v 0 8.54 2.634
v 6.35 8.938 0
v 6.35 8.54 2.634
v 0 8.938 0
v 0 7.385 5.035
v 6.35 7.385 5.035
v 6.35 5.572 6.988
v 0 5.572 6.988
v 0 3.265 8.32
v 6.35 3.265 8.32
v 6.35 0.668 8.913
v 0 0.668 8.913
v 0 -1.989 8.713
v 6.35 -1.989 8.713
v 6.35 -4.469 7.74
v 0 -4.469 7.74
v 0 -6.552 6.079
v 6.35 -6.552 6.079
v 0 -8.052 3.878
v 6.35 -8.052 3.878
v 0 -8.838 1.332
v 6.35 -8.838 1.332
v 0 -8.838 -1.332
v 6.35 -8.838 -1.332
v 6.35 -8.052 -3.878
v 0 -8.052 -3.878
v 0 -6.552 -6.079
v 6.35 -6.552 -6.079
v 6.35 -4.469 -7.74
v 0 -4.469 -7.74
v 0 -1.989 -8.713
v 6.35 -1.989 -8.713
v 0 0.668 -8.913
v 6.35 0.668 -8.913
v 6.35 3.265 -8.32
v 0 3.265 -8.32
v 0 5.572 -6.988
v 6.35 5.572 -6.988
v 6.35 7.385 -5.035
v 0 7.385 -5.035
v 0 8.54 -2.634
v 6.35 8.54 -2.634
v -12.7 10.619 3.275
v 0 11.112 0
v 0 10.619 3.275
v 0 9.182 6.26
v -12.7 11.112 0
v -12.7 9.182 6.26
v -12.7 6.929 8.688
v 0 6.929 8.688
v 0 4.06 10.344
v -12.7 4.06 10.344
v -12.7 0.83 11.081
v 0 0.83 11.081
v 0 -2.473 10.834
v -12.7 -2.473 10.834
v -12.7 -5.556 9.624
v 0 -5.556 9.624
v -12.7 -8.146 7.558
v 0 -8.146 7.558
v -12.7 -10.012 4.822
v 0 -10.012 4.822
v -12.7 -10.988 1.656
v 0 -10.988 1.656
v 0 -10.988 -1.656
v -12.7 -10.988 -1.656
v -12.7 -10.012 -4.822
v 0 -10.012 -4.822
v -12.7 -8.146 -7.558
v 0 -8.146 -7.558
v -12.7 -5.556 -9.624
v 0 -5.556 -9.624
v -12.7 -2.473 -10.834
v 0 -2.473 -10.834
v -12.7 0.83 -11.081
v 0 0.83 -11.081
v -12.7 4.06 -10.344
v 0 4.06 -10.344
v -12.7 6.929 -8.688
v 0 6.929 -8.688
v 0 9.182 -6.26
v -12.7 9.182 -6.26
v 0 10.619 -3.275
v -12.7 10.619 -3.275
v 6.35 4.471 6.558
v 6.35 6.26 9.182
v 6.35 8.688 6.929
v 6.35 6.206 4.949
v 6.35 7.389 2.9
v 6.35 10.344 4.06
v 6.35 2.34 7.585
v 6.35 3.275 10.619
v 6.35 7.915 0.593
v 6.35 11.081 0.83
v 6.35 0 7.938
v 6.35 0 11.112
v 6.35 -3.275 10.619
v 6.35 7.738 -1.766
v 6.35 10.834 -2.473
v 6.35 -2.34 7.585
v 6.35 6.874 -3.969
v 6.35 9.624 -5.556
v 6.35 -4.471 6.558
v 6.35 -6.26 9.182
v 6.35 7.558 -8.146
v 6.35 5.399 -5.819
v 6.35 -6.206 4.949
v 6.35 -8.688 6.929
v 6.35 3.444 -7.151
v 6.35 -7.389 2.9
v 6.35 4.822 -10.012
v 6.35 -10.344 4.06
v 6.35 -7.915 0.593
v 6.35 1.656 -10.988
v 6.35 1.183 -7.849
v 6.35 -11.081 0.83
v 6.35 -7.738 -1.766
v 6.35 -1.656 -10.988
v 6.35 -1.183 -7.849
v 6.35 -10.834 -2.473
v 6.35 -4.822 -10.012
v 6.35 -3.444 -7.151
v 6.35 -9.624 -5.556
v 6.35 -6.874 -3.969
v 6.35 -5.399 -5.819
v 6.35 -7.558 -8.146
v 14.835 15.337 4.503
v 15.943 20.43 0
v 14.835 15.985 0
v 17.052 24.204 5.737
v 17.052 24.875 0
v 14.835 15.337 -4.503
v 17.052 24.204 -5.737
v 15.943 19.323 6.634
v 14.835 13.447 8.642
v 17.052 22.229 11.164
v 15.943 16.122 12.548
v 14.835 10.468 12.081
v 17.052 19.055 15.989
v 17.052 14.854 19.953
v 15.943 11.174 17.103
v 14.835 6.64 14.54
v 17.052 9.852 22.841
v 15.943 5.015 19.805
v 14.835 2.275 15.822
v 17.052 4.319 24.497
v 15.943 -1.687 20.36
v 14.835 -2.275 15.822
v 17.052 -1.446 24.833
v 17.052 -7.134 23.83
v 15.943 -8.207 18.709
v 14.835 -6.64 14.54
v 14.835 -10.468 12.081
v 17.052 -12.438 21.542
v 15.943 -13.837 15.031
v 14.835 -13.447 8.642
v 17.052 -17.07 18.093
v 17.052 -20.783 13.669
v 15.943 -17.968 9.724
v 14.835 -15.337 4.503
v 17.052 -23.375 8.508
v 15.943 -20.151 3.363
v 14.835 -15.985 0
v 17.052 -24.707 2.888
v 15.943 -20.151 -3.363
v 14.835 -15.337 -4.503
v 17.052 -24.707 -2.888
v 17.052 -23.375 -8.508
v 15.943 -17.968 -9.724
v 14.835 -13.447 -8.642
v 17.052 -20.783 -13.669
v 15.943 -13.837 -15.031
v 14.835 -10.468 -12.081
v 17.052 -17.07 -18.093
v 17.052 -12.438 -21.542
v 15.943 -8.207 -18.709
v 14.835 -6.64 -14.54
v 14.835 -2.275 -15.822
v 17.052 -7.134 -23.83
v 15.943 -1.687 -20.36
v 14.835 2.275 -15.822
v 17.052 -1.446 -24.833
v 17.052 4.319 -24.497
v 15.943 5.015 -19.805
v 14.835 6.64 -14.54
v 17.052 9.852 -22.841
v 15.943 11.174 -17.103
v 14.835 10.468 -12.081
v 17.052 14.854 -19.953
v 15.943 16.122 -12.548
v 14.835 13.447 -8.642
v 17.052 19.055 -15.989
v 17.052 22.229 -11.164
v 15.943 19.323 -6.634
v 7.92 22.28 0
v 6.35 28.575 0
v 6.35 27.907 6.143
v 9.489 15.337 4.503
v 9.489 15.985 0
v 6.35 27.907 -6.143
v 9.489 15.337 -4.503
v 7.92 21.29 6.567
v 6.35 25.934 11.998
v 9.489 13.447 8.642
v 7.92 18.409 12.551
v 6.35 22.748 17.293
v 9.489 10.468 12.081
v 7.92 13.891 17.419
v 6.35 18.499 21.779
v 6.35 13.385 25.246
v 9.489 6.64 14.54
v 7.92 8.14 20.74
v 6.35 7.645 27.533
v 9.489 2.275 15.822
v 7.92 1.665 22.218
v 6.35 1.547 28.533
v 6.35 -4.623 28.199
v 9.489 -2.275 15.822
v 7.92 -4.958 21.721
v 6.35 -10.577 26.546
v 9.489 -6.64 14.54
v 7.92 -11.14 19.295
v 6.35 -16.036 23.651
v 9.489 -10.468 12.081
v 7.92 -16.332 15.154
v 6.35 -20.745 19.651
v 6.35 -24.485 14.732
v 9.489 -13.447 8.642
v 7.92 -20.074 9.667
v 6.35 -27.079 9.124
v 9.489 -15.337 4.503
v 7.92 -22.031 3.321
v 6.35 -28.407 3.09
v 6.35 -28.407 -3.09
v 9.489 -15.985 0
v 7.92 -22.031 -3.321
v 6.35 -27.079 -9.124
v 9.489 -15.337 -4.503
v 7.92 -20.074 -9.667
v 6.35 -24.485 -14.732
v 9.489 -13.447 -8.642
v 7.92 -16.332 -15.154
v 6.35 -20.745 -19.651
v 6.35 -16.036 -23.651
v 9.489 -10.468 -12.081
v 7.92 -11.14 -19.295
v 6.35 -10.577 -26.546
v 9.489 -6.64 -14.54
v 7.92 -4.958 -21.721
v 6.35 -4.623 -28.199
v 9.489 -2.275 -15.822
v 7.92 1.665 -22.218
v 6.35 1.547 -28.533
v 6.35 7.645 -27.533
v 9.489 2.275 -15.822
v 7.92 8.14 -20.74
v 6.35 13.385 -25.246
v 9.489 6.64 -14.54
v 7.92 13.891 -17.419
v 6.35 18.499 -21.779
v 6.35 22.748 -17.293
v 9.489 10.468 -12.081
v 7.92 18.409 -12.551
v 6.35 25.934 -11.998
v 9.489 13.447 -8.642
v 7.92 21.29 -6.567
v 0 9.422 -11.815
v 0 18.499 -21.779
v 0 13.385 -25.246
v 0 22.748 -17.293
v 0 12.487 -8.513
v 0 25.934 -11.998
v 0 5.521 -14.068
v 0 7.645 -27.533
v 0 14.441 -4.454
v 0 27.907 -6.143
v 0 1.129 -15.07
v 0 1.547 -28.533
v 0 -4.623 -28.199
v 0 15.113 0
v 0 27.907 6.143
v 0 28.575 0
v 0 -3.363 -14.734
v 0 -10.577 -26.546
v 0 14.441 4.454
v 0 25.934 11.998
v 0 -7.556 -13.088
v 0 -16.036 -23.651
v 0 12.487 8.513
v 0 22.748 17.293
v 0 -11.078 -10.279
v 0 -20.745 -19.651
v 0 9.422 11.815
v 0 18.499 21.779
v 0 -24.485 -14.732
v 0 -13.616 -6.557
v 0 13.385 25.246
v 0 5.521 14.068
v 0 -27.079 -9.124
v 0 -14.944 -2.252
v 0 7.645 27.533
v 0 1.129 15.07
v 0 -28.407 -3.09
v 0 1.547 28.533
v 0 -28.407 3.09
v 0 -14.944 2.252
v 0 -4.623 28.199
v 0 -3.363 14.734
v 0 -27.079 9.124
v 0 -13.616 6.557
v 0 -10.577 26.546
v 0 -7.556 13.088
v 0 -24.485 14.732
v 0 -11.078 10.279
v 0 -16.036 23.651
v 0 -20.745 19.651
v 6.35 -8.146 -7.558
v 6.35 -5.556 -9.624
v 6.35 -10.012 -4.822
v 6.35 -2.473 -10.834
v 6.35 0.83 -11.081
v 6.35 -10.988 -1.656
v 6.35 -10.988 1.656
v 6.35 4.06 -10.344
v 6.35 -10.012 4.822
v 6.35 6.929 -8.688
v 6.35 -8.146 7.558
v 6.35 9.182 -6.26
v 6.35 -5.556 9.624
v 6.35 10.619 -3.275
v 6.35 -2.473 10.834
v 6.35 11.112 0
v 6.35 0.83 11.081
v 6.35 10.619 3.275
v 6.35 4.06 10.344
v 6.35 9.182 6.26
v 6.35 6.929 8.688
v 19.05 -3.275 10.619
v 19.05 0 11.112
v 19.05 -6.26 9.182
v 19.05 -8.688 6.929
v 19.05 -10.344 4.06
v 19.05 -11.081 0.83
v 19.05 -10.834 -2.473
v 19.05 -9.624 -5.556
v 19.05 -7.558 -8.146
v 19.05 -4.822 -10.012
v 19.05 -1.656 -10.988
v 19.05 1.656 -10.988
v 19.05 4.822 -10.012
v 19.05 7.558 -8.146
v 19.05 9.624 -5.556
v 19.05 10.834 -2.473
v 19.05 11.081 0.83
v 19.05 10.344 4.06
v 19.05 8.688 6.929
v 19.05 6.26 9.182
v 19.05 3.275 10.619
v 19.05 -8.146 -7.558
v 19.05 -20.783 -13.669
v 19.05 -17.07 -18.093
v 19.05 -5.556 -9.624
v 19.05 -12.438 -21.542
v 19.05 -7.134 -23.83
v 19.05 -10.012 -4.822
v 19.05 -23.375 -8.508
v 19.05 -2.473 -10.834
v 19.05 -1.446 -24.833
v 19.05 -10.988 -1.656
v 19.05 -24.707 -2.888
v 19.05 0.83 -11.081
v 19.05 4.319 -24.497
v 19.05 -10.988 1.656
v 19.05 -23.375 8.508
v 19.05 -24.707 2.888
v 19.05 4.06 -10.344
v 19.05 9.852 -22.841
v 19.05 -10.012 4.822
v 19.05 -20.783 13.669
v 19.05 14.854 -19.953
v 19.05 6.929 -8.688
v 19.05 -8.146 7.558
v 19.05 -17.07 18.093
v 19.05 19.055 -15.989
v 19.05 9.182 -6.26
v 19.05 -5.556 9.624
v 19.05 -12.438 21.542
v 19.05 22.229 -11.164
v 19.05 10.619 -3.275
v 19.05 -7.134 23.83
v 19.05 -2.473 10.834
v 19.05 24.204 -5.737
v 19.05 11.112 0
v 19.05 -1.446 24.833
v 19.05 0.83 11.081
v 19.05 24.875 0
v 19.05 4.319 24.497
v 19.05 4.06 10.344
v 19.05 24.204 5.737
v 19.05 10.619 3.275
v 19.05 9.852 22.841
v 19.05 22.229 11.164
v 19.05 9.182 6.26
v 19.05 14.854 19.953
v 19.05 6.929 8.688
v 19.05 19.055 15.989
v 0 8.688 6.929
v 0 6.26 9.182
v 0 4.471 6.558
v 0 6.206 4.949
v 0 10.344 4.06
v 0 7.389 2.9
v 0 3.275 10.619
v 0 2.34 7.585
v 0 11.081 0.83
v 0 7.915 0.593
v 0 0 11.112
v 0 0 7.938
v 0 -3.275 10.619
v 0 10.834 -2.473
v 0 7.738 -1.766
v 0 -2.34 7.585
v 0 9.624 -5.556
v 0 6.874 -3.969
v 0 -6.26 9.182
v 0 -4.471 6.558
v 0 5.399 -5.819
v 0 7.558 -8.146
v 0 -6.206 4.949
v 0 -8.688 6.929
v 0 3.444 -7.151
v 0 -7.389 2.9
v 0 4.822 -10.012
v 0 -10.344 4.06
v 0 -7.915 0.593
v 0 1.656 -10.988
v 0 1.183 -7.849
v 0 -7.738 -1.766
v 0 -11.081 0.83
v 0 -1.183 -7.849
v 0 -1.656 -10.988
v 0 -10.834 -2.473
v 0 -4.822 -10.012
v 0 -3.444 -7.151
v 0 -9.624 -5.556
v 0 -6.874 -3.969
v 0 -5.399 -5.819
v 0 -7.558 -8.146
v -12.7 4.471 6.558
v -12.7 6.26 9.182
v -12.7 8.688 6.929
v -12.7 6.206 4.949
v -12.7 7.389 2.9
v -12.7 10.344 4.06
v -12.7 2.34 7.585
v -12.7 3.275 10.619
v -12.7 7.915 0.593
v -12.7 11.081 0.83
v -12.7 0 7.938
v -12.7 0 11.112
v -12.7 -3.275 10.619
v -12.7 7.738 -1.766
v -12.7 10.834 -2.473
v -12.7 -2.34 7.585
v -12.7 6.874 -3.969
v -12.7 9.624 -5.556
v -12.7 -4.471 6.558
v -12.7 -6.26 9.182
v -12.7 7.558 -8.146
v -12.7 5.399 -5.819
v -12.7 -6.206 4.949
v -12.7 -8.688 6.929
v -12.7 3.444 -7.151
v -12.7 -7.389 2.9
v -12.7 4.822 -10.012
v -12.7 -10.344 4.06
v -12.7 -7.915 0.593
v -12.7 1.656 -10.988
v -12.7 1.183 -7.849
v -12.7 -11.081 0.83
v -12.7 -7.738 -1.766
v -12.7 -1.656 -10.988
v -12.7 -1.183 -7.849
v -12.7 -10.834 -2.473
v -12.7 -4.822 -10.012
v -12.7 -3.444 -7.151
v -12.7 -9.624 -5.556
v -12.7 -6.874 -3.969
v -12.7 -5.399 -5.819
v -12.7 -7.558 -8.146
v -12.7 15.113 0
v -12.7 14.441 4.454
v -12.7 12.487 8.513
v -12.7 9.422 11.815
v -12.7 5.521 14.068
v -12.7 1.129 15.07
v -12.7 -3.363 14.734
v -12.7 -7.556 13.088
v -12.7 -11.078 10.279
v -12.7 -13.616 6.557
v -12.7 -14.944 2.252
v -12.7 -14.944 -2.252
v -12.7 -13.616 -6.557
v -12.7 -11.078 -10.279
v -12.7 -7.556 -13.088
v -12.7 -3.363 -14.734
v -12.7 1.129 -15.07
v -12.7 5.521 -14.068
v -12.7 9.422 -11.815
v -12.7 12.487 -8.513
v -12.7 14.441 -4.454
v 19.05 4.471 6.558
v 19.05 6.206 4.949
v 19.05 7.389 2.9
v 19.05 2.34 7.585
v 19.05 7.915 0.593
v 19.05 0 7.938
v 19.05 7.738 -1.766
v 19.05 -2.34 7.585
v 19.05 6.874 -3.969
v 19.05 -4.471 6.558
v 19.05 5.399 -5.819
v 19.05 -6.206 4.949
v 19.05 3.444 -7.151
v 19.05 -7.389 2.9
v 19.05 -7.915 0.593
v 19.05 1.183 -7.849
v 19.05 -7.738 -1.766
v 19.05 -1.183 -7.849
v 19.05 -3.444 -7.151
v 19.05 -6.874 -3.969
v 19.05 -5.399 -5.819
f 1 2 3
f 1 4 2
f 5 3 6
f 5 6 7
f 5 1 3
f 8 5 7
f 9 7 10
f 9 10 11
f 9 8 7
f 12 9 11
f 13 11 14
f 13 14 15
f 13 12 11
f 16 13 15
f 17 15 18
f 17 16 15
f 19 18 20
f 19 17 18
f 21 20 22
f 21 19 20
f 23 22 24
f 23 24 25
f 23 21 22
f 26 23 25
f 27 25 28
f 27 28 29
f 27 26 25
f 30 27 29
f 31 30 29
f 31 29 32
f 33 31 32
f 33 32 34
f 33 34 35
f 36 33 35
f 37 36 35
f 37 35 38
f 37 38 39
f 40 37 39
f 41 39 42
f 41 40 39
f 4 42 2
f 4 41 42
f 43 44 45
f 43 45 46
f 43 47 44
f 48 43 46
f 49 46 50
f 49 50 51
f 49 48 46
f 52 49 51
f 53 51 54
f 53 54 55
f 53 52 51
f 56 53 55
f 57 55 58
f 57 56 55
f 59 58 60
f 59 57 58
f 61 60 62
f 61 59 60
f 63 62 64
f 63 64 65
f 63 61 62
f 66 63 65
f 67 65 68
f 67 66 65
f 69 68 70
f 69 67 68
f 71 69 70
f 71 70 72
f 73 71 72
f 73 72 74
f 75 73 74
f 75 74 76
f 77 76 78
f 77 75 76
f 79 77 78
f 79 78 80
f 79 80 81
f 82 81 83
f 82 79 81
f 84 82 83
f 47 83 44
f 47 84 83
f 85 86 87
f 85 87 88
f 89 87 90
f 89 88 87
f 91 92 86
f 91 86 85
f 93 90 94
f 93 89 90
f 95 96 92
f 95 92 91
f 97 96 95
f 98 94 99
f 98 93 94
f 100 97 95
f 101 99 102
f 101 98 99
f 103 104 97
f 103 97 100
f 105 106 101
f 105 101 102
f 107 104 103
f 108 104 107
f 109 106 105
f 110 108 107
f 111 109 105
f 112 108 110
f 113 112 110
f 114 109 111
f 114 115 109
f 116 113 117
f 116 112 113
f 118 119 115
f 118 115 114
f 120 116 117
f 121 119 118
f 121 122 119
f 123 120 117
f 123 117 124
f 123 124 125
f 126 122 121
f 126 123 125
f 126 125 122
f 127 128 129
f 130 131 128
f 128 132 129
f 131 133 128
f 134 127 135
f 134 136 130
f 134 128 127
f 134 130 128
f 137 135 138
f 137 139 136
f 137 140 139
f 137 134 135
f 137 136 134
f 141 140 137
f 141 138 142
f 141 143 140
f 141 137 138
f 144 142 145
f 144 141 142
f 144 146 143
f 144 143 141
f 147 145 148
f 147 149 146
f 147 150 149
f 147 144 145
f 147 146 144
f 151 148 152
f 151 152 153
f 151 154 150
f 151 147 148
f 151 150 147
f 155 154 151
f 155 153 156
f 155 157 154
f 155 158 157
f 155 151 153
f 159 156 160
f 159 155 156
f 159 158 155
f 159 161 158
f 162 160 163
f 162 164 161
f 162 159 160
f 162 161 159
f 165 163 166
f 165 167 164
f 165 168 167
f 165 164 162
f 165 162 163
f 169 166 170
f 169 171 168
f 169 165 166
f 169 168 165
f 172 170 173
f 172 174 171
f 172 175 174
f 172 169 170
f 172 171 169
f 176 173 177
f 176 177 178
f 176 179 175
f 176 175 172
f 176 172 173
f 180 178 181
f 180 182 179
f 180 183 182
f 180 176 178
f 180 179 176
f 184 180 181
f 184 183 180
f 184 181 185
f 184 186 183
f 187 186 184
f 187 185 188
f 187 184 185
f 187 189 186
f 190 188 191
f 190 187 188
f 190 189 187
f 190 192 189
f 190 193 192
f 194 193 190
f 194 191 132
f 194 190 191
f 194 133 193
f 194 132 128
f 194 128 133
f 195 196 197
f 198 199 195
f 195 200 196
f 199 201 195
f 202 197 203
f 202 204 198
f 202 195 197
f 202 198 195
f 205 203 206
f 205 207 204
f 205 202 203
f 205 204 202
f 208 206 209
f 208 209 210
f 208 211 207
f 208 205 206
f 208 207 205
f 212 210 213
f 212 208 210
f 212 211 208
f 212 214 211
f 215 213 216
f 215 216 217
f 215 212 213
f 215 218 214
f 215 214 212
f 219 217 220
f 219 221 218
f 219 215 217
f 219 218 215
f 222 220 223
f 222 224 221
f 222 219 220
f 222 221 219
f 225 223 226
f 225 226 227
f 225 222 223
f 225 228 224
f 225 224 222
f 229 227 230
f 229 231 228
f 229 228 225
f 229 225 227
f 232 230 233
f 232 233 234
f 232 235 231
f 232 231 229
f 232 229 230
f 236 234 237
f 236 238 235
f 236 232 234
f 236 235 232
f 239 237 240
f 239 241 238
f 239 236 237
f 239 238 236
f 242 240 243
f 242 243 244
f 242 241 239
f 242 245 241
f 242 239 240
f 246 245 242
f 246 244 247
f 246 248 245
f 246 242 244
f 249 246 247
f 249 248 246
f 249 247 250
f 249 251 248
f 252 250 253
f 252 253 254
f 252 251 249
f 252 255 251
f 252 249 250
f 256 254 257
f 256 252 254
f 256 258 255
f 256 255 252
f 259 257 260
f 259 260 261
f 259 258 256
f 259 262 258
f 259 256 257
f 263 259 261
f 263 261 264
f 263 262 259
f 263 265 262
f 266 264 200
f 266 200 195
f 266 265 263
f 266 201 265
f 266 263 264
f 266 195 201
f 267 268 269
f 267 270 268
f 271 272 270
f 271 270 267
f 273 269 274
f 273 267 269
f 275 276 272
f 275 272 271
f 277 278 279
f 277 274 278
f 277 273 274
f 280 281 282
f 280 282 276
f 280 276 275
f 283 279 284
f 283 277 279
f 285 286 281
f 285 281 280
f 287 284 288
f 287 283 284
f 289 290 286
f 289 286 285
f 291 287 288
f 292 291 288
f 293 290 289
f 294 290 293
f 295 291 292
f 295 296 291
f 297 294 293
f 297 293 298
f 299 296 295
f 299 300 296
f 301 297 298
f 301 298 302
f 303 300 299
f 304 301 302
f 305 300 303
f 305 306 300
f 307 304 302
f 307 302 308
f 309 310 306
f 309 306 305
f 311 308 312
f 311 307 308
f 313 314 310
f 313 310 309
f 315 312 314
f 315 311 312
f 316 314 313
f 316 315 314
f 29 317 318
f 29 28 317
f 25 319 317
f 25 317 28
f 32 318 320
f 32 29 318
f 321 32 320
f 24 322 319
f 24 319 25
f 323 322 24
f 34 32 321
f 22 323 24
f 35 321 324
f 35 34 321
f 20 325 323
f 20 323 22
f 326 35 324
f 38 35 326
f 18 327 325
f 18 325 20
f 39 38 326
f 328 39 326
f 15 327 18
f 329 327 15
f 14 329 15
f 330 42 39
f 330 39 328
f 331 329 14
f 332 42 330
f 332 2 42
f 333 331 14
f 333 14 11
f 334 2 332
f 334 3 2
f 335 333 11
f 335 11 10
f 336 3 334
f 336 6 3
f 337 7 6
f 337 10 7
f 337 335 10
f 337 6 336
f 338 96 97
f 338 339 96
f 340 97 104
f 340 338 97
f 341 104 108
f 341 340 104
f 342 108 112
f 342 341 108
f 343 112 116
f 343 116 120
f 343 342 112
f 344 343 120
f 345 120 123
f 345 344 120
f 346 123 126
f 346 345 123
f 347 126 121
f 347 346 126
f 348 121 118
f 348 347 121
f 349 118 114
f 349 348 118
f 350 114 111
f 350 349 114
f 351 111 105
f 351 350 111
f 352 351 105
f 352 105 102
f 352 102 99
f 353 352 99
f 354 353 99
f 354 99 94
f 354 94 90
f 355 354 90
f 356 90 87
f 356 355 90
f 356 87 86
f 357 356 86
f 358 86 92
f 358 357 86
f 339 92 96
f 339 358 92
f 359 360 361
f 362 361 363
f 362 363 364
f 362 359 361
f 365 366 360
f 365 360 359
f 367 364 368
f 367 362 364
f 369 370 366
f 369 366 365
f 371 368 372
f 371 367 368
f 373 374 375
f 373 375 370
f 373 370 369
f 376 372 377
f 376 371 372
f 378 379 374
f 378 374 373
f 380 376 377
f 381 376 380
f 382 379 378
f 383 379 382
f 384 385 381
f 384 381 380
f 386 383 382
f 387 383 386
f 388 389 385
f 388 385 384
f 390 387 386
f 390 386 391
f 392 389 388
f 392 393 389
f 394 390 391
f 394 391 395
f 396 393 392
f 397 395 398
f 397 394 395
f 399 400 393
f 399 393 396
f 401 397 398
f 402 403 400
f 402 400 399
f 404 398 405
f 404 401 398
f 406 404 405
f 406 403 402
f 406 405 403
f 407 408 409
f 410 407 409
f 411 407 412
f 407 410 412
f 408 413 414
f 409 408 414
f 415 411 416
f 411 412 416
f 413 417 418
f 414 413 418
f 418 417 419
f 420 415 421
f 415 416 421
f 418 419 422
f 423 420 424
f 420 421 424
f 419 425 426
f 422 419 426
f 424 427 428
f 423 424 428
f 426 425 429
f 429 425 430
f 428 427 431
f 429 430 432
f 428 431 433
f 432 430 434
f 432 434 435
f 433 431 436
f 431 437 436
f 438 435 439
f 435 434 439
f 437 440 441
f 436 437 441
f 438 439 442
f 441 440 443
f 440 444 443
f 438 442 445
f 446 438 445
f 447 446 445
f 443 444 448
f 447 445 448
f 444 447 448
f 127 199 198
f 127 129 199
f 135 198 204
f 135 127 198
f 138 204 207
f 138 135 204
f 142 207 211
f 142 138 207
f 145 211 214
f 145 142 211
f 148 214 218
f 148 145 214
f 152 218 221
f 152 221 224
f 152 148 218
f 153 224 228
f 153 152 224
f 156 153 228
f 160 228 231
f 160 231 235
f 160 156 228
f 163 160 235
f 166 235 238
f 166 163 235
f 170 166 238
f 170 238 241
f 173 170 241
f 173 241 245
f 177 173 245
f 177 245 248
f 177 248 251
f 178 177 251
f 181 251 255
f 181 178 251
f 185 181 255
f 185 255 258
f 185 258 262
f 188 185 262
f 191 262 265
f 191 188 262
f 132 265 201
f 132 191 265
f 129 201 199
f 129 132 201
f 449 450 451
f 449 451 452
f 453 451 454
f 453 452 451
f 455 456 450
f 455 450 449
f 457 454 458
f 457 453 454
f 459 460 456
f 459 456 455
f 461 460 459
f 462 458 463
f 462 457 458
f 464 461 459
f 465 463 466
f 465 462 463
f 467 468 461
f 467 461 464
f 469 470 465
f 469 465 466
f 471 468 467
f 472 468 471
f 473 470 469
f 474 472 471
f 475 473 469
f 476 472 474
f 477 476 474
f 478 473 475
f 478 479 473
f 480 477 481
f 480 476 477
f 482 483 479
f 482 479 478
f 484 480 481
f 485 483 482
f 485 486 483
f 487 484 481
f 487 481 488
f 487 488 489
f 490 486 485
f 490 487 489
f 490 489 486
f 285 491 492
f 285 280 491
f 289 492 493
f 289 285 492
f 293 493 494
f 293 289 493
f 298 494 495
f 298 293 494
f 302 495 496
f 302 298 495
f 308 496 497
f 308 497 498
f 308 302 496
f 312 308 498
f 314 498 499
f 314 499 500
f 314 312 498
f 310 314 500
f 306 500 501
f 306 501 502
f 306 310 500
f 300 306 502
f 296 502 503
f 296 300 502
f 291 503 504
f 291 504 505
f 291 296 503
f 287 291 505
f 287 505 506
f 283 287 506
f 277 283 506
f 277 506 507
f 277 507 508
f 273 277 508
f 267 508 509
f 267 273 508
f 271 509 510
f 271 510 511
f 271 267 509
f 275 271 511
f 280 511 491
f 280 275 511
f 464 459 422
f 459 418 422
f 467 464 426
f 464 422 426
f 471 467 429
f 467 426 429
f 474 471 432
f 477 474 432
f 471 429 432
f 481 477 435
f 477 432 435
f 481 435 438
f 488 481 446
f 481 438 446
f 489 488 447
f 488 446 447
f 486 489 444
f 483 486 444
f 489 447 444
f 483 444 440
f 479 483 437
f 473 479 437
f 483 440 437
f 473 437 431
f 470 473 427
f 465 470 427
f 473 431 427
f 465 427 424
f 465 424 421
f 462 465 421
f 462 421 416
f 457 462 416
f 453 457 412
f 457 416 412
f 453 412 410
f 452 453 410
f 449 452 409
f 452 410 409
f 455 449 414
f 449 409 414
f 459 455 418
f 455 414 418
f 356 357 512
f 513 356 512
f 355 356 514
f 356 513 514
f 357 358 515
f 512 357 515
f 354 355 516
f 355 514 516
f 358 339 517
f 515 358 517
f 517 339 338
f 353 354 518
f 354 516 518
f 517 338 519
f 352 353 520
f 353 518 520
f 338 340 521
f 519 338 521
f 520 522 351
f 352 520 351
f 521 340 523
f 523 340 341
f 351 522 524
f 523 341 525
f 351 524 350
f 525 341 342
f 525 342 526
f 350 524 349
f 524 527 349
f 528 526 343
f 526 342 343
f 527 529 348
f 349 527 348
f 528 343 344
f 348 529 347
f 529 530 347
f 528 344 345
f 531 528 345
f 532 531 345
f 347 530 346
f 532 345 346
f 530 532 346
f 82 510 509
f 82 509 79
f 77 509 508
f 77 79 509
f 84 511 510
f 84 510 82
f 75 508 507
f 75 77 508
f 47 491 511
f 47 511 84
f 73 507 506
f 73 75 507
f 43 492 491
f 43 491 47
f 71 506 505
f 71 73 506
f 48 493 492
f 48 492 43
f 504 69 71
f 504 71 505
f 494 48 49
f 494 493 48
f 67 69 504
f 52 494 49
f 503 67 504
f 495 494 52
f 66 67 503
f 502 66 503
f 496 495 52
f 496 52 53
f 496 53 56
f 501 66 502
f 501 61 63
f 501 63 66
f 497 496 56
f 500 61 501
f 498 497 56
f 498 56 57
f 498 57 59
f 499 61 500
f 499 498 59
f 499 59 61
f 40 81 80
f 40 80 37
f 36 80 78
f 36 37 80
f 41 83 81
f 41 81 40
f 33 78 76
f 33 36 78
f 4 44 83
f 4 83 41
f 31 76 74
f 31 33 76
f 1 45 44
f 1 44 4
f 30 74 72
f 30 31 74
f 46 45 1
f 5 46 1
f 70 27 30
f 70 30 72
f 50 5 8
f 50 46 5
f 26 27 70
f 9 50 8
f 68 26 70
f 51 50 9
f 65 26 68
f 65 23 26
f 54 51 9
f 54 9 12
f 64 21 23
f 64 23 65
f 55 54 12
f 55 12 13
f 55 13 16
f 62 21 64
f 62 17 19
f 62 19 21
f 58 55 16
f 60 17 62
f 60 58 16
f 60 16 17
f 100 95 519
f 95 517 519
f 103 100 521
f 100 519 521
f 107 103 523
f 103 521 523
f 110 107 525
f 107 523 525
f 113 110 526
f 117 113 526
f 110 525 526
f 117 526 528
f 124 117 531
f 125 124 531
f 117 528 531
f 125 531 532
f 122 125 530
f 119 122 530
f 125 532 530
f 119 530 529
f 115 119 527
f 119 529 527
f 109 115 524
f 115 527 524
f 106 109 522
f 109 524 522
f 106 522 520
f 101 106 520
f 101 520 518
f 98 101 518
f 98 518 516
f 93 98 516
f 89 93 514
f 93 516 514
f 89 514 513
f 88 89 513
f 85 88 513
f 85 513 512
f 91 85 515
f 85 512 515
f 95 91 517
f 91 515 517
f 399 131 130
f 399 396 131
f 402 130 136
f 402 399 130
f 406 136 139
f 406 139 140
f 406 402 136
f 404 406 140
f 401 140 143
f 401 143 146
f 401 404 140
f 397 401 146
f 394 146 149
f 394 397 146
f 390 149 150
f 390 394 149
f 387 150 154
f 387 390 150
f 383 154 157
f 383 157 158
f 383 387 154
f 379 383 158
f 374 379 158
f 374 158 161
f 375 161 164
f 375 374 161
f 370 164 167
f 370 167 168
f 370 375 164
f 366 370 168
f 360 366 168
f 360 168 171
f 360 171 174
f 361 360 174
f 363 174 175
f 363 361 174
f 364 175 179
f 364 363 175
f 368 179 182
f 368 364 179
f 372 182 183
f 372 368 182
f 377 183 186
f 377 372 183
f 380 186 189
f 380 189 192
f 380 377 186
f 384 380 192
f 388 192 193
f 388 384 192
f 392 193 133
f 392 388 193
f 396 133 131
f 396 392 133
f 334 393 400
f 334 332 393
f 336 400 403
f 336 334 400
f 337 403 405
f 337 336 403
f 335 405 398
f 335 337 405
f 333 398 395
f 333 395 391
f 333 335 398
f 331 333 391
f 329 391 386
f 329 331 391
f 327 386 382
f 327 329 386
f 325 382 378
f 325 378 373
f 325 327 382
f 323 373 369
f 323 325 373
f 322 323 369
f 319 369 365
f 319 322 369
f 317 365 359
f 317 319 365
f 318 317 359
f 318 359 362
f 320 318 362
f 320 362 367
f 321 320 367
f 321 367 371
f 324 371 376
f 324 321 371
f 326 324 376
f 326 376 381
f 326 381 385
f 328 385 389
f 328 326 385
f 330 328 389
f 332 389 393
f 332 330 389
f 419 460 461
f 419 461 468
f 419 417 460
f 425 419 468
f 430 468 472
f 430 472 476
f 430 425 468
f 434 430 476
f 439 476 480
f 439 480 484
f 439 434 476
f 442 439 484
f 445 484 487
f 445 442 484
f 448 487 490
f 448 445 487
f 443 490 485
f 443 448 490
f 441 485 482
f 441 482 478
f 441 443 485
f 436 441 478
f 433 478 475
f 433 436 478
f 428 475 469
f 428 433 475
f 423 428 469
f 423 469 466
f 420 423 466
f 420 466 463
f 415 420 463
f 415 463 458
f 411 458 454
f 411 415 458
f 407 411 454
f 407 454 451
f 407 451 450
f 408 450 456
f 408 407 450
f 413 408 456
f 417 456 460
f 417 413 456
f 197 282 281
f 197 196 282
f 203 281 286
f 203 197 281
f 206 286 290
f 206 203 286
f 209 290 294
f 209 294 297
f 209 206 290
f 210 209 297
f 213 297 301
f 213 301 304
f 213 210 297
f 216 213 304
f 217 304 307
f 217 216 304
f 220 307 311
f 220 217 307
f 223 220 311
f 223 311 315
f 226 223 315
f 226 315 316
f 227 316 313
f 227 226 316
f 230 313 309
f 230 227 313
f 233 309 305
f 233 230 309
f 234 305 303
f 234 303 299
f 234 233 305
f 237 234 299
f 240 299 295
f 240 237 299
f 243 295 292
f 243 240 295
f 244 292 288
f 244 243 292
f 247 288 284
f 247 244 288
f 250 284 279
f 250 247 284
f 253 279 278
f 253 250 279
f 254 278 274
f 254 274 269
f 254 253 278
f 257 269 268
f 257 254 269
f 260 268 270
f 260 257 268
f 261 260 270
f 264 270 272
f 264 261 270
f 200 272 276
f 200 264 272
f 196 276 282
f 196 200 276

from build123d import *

# Parameters (mm, degrees)
SKETCH5_W = 12.7
SKETCH5_H = 3.175


# Read off the part's stored shape, not the designer's step: Revolve1
with BuildPart() as part:
    # Revolve1 outline → Revolve1 (revolve)
    with BuildSketch(Plane.YX):
        Polygon((11.1125, 0), (11.1125, -12.7), (15.112500017, -12.7), (15.112500017, 0), (28.575, 0), (28.575, 6.35), (15.985000034, 9.489039547), (15.985000034, 14.834987657), (24.875000034, 17.051513602), (24.875000034, 19.05), (11.1125, 19.05), (11.1125, 6.35), (8.9375, 6.35), (8.9375, 0), align=None)
    revolve(axis=Axis((0, 0, 0), (1, 0, 0)))


with BuildPart() as body_2:
    # Sketch5 → Revolve2 (revolve)
    with BuildSketch(Plane.XY, mode=Mode.PRIVATE) as revolve2_sk:
        with Locations((12.7, 9.525)):
            Rectangle(SKETCH5_W, SKETCH5_H)
        with Locations((-6.35, 9.525)):
            Rectangle(SKETCH5_W, SKETCH5_H)
    revolve(revolve2_sk.sketch.rotate(Axis((0, 0, 0), (1, 0, 0)), 90), axis=Axis((0, 0, 0), (1, 0, 0)))


solid = Compound([part.part, body_2.part])
